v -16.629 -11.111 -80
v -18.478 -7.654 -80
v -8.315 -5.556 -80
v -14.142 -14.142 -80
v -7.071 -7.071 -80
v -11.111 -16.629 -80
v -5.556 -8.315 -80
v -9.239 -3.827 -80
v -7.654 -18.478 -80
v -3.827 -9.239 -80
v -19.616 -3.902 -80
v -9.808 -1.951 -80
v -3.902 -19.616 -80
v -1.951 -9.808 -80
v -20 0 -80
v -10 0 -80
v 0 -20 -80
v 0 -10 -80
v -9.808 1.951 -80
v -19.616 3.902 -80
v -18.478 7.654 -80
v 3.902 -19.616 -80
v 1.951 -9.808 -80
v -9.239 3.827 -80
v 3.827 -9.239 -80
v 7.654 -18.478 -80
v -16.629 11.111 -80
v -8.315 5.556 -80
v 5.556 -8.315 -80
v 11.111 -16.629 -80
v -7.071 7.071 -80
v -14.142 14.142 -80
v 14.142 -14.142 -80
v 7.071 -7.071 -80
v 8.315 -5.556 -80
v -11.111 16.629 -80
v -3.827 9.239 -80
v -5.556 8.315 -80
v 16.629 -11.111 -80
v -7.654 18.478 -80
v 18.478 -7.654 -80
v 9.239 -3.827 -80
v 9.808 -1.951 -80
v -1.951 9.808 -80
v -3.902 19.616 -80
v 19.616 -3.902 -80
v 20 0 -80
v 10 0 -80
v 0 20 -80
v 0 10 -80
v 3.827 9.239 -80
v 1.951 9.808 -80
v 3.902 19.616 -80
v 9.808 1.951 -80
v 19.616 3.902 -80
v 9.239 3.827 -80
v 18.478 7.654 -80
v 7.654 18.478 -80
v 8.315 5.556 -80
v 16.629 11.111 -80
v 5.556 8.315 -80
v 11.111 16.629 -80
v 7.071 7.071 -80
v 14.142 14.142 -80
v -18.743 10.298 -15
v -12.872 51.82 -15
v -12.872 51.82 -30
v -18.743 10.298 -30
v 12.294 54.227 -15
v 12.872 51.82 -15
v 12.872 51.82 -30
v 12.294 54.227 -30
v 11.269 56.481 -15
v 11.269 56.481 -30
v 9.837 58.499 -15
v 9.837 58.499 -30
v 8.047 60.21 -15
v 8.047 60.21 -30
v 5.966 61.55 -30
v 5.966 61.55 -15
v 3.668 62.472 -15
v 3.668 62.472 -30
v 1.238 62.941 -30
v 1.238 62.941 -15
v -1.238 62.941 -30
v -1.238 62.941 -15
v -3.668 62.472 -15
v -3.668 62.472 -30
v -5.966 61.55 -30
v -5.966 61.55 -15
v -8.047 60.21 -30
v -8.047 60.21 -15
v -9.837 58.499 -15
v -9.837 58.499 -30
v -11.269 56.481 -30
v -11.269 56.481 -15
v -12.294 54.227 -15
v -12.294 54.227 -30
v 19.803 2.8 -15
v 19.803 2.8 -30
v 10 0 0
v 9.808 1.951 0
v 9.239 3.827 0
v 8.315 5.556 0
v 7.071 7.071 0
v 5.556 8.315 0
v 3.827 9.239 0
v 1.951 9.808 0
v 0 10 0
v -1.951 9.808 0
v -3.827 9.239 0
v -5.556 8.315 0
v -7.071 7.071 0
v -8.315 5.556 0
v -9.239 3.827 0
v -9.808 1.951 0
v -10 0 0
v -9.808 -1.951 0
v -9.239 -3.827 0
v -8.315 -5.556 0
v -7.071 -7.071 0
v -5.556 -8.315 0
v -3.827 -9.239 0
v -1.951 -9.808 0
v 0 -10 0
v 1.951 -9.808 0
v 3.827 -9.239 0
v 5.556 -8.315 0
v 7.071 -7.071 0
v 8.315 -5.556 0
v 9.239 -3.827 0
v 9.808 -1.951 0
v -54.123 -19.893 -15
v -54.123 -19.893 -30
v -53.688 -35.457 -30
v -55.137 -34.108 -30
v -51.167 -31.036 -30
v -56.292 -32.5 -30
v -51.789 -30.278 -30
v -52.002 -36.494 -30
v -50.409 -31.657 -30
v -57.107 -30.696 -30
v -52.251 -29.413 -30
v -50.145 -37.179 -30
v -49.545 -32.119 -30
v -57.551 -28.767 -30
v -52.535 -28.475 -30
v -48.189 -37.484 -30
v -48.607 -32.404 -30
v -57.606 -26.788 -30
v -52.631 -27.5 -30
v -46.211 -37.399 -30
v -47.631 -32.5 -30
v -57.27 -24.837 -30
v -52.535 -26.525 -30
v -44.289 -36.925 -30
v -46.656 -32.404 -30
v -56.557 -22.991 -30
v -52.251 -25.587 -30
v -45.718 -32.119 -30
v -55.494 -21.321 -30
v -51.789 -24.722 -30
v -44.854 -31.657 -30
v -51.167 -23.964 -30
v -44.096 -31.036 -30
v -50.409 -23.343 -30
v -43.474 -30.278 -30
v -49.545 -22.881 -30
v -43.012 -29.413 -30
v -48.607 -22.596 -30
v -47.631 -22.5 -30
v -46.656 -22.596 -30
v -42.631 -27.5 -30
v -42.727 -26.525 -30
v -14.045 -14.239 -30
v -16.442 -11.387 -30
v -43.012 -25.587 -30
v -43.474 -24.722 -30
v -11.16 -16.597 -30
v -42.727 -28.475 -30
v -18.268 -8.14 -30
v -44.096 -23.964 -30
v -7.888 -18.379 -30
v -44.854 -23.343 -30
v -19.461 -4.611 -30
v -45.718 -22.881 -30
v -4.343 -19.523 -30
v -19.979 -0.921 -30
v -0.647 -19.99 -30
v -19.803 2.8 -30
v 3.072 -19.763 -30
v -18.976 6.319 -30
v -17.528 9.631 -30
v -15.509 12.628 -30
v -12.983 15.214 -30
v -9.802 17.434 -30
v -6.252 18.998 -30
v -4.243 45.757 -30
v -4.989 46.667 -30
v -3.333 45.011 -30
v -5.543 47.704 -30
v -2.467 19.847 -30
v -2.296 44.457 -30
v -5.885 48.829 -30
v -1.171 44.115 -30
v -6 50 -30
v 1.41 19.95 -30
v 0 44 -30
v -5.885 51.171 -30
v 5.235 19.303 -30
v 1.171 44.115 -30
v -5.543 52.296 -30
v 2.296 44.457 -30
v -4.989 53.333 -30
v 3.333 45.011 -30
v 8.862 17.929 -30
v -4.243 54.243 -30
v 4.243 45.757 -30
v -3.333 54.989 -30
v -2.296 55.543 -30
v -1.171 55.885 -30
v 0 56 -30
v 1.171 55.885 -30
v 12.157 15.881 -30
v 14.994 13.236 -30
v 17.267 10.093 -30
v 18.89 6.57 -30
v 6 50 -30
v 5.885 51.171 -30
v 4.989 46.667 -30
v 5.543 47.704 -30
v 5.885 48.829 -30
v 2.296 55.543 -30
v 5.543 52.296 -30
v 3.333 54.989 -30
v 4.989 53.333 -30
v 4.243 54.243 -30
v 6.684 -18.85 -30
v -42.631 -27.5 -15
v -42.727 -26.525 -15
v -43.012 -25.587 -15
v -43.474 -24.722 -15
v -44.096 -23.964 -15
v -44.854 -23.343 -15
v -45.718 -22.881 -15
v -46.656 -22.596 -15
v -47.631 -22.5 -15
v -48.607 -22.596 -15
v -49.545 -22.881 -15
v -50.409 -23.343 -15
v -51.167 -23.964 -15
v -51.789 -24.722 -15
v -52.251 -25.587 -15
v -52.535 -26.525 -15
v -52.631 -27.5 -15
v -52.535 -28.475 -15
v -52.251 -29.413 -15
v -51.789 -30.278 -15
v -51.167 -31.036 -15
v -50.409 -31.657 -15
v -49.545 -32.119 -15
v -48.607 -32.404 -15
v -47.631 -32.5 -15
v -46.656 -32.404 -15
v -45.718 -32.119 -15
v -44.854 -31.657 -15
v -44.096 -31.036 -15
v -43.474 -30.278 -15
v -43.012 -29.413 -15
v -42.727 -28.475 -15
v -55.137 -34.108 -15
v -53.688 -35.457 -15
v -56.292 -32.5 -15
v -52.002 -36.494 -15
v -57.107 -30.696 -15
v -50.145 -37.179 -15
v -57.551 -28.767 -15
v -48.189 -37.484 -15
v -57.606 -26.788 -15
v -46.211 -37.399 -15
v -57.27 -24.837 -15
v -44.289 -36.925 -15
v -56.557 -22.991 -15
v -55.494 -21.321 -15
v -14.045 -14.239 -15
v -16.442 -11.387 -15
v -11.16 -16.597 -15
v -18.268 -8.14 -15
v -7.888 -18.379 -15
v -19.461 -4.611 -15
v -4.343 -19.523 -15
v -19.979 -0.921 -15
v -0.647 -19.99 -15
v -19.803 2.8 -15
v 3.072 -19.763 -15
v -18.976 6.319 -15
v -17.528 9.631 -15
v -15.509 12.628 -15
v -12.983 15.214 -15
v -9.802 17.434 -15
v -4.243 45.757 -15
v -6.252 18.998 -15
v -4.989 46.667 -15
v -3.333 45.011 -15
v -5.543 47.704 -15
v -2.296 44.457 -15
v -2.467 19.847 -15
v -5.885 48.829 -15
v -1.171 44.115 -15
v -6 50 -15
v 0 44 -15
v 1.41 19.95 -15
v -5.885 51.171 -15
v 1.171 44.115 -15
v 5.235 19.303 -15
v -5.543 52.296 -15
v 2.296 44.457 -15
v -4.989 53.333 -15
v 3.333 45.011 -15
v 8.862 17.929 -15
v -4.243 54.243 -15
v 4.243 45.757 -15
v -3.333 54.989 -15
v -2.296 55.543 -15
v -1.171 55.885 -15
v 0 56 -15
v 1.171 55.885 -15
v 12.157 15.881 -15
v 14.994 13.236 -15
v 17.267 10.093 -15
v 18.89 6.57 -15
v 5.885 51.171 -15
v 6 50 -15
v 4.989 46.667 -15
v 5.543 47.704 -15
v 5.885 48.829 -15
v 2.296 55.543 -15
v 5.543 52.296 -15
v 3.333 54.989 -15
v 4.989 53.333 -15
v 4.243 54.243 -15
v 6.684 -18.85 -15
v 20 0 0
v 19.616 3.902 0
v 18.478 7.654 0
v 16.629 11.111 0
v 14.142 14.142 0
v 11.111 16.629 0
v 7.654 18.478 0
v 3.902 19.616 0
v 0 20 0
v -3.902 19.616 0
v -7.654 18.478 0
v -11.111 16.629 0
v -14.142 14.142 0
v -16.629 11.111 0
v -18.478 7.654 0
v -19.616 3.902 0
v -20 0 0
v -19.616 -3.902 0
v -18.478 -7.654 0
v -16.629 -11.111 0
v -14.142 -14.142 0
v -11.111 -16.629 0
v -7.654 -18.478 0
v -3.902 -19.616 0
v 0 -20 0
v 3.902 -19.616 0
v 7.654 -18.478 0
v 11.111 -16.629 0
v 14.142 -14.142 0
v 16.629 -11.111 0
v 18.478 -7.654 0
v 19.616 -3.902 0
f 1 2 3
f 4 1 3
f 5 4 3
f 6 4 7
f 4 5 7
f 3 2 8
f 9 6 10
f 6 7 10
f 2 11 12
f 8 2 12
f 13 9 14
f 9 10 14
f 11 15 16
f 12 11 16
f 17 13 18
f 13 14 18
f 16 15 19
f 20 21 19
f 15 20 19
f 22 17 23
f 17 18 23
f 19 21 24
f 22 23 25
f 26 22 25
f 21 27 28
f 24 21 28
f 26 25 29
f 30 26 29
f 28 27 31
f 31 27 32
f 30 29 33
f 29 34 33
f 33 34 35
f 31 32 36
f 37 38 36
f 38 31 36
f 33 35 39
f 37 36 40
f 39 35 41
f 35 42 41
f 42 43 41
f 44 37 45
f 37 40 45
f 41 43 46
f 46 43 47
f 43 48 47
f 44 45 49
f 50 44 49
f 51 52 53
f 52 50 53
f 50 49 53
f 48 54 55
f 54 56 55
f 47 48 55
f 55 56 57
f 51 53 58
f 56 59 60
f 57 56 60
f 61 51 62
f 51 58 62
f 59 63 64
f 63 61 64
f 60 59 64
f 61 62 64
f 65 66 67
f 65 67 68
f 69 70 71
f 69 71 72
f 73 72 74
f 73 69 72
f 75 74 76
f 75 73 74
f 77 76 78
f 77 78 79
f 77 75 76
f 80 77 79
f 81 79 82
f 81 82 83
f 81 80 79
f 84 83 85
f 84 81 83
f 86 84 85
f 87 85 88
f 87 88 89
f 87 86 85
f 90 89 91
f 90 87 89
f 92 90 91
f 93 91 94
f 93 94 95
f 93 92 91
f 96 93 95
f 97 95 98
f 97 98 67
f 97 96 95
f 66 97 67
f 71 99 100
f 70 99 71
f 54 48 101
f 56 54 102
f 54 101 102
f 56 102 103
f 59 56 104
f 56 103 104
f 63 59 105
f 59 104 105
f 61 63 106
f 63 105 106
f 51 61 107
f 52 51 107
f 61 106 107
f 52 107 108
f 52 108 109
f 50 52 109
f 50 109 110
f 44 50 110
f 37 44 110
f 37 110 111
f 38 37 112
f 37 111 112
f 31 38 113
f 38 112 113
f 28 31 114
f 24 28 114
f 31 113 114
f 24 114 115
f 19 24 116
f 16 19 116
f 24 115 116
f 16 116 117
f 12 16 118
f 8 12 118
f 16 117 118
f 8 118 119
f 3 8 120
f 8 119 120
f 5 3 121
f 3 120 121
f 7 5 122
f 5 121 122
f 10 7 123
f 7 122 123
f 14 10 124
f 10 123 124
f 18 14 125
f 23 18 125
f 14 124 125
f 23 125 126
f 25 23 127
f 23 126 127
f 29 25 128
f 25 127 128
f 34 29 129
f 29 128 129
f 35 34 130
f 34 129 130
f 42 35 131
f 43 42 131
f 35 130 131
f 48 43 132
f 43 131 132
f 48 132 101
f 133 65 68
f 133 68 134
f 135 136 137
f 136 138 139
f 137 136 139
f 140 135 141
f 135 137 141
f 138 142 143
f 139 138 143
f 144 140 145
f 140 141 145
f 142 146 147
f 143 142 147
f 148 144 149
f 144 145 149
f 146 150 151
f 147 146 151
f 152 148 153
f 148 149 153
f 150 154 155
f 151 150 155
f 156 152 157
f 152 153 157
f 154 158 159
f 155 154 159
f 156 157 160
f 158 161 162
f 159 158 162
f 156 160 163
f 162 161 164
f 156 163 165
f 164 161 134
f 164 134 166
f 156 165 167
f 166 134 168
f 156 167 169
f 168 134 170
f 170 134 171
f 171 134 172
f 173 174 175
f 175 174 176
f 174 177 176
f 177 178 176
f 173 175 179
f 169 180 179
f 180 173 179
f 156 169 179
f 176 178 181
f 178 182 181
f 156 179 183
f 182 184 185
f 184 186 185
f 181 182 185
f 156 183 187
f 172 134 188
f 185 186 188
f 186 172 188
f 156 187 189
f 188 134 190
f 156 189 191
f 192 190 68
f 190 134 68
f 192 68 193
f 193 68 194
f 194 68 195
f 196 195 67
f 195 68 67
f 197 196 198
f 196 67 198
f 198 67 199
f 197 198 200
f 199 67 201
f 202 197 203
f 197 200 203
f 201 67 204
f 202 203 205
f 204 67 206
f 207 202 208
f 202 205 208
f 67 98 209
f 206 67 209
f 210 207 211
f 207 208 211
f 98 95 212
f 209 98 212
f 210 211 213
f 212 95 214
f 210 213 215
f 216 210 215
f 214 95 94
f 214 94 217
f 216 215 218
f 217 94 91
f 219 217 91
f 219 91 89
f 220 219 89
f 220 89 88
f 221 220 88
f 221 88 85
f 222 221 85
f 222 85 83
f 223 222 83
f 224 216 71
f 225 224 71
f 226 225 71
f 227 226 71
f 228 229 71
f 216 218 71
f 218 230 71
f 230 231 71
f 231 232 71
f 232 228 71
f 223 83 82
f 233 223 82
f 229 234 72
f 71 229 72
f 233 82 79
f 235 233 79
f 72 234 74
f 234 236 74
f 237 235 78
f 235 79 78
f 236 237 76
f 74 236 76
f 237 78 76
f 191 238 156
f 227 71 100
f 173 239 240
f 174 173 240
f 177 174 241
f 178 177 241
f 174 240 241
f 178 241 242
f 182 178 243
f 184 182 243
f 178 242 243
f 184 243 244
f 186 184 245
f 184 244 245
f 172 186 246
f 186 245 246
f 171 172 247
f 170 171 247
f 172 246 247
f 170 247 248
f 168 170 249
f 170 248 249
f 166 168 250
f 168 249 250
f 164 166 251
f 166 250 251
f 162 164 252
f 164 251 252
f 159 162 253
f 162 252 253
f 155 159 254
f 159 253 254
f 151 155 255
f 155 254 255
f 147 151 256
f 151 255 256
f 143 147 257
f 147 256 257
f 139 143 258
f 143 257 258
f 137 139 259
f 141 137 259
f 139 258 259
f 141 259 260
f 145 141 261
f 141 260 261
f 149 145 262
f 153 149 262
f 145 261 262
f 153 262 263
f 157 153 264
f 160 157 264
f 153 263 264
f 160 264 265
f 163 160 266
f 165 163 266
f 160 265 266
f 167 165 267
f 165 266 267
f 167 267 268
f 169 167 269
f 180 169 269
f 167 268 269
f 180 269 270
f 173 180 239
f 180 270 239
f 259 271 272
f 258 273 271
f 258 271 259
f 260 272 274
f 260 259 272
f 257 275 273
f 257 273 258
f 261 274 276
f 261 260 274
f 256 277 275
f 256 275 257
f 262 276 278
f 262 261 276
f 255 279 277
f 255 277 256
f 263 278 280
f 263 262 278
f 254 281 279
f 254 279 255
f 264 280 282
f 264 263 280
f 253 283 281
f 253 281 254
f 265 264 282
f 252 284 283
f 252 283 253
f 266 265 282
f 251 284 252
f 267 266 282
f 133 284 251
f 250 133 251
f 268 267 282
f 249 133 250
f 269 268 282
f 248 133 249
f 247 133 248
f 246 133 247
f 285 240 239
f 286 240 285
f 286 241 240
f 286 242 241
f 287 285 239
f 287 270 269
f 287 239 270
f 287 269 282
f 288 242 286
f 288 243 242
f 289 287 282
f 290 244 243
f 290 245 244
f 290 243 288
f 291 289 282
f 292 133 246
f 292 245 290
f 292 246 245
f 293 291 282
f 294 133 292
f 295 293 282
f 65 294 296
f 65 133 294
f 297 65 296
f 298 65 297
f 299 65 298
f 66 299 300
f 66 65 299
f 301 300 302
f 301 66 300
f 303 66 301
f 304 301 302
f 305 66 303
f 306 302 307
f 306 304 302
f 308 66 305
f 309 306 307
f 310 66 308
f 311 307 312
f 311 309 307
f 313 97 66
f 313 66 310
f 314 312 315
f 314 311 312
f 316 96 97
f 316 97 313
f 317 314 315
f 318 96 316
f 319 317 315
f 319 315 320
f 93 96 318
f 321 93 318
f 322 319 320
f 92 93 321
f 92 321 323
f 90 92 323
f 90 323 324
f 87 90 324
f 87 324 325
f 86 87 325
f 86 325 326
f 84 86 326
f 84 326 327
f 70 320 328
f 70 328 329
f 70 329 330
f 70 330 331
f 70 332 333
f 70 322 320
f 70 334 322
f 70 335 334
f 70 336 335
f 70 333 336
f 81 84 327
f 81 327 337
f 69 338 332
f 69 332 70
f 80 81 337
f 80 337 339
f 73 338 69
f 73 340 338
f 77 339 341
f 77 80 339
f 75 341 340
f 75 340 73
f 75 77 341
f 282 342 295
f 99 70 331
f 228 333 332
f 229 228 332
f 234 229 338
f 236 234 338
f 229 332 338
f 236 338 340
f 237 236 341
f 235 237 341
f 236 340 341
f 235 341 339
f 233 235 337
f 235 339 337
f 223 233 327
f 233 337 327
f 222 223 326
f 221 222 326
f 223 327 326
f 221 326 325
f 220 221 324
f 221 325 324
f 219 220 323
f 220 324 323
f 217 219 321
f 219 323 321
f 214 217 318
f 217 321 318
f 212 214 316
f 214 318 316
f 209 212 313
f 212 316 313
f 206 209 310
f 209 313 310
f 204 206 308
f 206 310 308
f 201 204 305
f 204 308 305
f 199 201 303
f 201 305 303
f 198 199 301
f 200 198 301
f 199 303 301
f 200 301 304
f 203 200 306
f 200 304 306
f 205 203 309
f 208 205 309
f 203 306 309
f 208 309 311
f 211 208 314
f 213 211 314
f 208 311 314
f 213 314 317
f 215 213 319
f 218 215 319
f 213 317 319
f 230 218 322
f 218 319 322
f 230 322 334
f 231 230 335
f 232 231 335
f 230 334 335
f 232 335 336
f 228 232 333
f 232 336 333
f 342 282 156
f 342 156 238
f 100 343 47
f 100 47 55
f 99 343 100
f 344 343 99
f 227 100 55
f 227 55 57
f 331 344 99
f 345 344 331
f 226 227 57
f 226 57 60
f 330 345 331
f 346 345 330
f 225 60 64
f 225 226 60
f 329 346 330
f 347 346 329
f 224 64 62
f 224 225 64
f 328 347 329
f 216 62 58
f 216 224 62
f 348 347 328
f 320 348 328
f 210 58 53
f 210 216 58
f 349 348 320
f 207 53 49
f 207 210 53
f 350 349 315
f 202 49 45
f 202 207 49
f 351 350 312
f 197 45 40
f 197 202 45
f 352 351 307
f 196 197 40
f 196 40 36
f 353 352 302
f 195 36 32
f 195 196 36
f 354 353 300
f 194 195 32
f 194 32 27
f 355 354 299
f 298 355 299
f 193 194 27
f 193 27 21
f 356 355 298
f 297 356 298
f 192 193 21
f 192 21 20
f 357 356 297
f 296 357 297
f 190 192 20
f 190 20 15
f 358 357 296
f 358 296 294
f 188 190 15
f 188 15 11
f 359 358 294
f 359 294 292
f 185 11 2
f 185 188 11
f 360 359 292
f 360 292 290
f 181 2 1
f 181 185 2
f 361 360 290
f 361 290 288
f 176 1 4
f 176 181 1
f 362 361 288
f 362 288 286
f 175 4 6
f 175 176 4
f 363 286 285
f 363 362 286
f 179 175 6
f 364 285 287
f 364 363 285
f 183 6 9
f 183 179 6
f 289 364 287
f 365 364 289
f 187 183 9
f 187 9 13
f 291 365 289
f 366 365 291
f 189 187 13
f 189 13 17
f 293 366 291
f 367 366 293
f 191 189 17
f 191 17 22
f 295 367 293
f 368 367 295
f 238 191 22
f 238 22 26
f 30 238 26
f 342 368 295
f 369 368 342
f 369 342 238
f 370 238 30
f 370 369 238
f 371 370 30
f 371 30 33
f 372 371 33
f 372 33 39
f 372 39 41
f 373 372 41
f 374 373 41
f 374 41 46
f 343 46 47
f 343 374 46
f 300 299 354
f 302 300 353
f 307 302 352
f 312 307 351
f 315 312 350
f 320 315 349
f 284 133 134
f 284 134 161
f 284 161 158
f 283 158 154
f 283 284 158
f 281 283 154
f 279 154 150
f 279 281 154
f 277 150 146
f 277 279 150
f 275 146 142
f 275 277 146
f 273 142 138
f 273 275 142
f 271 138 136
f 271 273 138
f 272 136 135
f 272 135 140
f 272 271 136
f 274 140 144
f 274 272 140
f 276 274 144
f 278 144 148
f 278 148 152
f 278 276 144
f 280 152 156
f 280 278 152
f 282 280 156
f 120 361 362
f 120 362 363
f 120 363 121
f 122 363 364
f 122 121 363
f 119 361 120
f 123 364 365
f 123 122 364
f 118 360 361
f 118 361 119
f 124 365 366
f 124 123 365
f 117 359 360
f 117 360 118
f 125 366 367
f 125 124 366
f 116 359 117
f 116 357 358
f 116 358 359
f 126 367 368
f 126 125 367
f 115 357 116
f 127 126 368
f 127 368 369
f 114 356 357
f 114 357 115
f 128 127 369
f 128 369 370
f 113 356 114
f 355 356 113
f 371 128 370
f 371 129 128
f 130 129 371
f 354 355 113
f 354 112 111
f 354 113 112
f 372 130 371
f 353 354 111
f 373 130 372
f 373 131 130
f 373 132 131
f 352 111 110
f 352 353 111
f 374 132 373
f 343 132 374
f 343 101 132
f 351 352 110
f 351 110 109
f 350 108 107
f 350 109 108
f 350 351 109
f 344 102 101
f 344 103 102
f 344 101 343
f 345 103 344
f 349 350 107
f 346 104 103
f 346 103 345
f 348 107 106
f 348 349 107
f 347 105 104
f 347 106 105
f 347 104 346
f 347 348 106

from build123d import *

# Parameters (mm, degrees)
SKETCH_1_R      = 10
EXTRUDE_1_DEPTH = 80
EXTRUDE_START   = -15
SKETCH_1_3_R    = 5
SKETCH_1_3_R_2  = 6
EXTRUDE_2_DEPTH = 15


with BuildPart() as part:
    # Эскиз1 → Бобышка-Вытянуть1 (new body)
    with BuildSketch(Plane.XY):
        with BuildLine():
            ThreePointArc((19.803030071, 2.8), (7.081980571, 18.704158661), (-12.982504947, 15.213630905))
            ThreePointArc((-12.982504947, 15.213630905), (-17.528473541, 9.630815923), (-19.803030071, 2.8))
            ThreePointArc((-19.803030071, 2.8), (-12.657286271, -15.485254414), (6.684138374, -18.849994541))
            ThreePointArc((6.684138374, -18.849994541), (16.335280339, -11.539437433), (20, 0))
            ThreePointArc((20, 0), (19.950696748, 1.403459757), (19.803030071, 2.8))
        make_face()
        Circle(SKETCH_1_R, mode=Mode.SUBTRACT)
    extrude(amount=-EXTRUDE_1_DEPTH)

    # Эскиз1<3> → Бобышка-Вытянуть2 (add)
    with BuildSketch(Plane.XY.offset(EXTRUDE_START)):
        with BuildLine():
            Line((-18.742862332, 10.29804772), (-54.122649682, -19.893184548))
            ThreePointArc((-54.122649682, -19.893184548), (-56.291651246, -32.5), (-44.289328021, -36.924997271))
            Line((-44.289328021, -36.924997271), (6.684138374, -18.849994541))
            ThreePointArc((6.684138374, -18.849994541), (-17.104768018, 10.364695414), (19.803030071, 2.8))
            Line((19.803030071, 2.8), (12.871969546, 51.82))
            ThreePointArc((12.871969546, 51.82), (0, 63), (-12.871969546, 51.82))
            Line((-12.871969546, 51.82), (-18.742862332, 10.29804772))
        make_face()
        with Locations((-47.631397208, -27.5)):
            Circle(SKETCH_1_3_R, mode=Mode.SUBTRACT)
        with Locations((0, 50)):
            Circle(SKETCH_1_3_R_2, mode=Mode.SUBTRACT)
    extrude(amount=-EXTRUDE_2_DEPTH)


solid = part.part
